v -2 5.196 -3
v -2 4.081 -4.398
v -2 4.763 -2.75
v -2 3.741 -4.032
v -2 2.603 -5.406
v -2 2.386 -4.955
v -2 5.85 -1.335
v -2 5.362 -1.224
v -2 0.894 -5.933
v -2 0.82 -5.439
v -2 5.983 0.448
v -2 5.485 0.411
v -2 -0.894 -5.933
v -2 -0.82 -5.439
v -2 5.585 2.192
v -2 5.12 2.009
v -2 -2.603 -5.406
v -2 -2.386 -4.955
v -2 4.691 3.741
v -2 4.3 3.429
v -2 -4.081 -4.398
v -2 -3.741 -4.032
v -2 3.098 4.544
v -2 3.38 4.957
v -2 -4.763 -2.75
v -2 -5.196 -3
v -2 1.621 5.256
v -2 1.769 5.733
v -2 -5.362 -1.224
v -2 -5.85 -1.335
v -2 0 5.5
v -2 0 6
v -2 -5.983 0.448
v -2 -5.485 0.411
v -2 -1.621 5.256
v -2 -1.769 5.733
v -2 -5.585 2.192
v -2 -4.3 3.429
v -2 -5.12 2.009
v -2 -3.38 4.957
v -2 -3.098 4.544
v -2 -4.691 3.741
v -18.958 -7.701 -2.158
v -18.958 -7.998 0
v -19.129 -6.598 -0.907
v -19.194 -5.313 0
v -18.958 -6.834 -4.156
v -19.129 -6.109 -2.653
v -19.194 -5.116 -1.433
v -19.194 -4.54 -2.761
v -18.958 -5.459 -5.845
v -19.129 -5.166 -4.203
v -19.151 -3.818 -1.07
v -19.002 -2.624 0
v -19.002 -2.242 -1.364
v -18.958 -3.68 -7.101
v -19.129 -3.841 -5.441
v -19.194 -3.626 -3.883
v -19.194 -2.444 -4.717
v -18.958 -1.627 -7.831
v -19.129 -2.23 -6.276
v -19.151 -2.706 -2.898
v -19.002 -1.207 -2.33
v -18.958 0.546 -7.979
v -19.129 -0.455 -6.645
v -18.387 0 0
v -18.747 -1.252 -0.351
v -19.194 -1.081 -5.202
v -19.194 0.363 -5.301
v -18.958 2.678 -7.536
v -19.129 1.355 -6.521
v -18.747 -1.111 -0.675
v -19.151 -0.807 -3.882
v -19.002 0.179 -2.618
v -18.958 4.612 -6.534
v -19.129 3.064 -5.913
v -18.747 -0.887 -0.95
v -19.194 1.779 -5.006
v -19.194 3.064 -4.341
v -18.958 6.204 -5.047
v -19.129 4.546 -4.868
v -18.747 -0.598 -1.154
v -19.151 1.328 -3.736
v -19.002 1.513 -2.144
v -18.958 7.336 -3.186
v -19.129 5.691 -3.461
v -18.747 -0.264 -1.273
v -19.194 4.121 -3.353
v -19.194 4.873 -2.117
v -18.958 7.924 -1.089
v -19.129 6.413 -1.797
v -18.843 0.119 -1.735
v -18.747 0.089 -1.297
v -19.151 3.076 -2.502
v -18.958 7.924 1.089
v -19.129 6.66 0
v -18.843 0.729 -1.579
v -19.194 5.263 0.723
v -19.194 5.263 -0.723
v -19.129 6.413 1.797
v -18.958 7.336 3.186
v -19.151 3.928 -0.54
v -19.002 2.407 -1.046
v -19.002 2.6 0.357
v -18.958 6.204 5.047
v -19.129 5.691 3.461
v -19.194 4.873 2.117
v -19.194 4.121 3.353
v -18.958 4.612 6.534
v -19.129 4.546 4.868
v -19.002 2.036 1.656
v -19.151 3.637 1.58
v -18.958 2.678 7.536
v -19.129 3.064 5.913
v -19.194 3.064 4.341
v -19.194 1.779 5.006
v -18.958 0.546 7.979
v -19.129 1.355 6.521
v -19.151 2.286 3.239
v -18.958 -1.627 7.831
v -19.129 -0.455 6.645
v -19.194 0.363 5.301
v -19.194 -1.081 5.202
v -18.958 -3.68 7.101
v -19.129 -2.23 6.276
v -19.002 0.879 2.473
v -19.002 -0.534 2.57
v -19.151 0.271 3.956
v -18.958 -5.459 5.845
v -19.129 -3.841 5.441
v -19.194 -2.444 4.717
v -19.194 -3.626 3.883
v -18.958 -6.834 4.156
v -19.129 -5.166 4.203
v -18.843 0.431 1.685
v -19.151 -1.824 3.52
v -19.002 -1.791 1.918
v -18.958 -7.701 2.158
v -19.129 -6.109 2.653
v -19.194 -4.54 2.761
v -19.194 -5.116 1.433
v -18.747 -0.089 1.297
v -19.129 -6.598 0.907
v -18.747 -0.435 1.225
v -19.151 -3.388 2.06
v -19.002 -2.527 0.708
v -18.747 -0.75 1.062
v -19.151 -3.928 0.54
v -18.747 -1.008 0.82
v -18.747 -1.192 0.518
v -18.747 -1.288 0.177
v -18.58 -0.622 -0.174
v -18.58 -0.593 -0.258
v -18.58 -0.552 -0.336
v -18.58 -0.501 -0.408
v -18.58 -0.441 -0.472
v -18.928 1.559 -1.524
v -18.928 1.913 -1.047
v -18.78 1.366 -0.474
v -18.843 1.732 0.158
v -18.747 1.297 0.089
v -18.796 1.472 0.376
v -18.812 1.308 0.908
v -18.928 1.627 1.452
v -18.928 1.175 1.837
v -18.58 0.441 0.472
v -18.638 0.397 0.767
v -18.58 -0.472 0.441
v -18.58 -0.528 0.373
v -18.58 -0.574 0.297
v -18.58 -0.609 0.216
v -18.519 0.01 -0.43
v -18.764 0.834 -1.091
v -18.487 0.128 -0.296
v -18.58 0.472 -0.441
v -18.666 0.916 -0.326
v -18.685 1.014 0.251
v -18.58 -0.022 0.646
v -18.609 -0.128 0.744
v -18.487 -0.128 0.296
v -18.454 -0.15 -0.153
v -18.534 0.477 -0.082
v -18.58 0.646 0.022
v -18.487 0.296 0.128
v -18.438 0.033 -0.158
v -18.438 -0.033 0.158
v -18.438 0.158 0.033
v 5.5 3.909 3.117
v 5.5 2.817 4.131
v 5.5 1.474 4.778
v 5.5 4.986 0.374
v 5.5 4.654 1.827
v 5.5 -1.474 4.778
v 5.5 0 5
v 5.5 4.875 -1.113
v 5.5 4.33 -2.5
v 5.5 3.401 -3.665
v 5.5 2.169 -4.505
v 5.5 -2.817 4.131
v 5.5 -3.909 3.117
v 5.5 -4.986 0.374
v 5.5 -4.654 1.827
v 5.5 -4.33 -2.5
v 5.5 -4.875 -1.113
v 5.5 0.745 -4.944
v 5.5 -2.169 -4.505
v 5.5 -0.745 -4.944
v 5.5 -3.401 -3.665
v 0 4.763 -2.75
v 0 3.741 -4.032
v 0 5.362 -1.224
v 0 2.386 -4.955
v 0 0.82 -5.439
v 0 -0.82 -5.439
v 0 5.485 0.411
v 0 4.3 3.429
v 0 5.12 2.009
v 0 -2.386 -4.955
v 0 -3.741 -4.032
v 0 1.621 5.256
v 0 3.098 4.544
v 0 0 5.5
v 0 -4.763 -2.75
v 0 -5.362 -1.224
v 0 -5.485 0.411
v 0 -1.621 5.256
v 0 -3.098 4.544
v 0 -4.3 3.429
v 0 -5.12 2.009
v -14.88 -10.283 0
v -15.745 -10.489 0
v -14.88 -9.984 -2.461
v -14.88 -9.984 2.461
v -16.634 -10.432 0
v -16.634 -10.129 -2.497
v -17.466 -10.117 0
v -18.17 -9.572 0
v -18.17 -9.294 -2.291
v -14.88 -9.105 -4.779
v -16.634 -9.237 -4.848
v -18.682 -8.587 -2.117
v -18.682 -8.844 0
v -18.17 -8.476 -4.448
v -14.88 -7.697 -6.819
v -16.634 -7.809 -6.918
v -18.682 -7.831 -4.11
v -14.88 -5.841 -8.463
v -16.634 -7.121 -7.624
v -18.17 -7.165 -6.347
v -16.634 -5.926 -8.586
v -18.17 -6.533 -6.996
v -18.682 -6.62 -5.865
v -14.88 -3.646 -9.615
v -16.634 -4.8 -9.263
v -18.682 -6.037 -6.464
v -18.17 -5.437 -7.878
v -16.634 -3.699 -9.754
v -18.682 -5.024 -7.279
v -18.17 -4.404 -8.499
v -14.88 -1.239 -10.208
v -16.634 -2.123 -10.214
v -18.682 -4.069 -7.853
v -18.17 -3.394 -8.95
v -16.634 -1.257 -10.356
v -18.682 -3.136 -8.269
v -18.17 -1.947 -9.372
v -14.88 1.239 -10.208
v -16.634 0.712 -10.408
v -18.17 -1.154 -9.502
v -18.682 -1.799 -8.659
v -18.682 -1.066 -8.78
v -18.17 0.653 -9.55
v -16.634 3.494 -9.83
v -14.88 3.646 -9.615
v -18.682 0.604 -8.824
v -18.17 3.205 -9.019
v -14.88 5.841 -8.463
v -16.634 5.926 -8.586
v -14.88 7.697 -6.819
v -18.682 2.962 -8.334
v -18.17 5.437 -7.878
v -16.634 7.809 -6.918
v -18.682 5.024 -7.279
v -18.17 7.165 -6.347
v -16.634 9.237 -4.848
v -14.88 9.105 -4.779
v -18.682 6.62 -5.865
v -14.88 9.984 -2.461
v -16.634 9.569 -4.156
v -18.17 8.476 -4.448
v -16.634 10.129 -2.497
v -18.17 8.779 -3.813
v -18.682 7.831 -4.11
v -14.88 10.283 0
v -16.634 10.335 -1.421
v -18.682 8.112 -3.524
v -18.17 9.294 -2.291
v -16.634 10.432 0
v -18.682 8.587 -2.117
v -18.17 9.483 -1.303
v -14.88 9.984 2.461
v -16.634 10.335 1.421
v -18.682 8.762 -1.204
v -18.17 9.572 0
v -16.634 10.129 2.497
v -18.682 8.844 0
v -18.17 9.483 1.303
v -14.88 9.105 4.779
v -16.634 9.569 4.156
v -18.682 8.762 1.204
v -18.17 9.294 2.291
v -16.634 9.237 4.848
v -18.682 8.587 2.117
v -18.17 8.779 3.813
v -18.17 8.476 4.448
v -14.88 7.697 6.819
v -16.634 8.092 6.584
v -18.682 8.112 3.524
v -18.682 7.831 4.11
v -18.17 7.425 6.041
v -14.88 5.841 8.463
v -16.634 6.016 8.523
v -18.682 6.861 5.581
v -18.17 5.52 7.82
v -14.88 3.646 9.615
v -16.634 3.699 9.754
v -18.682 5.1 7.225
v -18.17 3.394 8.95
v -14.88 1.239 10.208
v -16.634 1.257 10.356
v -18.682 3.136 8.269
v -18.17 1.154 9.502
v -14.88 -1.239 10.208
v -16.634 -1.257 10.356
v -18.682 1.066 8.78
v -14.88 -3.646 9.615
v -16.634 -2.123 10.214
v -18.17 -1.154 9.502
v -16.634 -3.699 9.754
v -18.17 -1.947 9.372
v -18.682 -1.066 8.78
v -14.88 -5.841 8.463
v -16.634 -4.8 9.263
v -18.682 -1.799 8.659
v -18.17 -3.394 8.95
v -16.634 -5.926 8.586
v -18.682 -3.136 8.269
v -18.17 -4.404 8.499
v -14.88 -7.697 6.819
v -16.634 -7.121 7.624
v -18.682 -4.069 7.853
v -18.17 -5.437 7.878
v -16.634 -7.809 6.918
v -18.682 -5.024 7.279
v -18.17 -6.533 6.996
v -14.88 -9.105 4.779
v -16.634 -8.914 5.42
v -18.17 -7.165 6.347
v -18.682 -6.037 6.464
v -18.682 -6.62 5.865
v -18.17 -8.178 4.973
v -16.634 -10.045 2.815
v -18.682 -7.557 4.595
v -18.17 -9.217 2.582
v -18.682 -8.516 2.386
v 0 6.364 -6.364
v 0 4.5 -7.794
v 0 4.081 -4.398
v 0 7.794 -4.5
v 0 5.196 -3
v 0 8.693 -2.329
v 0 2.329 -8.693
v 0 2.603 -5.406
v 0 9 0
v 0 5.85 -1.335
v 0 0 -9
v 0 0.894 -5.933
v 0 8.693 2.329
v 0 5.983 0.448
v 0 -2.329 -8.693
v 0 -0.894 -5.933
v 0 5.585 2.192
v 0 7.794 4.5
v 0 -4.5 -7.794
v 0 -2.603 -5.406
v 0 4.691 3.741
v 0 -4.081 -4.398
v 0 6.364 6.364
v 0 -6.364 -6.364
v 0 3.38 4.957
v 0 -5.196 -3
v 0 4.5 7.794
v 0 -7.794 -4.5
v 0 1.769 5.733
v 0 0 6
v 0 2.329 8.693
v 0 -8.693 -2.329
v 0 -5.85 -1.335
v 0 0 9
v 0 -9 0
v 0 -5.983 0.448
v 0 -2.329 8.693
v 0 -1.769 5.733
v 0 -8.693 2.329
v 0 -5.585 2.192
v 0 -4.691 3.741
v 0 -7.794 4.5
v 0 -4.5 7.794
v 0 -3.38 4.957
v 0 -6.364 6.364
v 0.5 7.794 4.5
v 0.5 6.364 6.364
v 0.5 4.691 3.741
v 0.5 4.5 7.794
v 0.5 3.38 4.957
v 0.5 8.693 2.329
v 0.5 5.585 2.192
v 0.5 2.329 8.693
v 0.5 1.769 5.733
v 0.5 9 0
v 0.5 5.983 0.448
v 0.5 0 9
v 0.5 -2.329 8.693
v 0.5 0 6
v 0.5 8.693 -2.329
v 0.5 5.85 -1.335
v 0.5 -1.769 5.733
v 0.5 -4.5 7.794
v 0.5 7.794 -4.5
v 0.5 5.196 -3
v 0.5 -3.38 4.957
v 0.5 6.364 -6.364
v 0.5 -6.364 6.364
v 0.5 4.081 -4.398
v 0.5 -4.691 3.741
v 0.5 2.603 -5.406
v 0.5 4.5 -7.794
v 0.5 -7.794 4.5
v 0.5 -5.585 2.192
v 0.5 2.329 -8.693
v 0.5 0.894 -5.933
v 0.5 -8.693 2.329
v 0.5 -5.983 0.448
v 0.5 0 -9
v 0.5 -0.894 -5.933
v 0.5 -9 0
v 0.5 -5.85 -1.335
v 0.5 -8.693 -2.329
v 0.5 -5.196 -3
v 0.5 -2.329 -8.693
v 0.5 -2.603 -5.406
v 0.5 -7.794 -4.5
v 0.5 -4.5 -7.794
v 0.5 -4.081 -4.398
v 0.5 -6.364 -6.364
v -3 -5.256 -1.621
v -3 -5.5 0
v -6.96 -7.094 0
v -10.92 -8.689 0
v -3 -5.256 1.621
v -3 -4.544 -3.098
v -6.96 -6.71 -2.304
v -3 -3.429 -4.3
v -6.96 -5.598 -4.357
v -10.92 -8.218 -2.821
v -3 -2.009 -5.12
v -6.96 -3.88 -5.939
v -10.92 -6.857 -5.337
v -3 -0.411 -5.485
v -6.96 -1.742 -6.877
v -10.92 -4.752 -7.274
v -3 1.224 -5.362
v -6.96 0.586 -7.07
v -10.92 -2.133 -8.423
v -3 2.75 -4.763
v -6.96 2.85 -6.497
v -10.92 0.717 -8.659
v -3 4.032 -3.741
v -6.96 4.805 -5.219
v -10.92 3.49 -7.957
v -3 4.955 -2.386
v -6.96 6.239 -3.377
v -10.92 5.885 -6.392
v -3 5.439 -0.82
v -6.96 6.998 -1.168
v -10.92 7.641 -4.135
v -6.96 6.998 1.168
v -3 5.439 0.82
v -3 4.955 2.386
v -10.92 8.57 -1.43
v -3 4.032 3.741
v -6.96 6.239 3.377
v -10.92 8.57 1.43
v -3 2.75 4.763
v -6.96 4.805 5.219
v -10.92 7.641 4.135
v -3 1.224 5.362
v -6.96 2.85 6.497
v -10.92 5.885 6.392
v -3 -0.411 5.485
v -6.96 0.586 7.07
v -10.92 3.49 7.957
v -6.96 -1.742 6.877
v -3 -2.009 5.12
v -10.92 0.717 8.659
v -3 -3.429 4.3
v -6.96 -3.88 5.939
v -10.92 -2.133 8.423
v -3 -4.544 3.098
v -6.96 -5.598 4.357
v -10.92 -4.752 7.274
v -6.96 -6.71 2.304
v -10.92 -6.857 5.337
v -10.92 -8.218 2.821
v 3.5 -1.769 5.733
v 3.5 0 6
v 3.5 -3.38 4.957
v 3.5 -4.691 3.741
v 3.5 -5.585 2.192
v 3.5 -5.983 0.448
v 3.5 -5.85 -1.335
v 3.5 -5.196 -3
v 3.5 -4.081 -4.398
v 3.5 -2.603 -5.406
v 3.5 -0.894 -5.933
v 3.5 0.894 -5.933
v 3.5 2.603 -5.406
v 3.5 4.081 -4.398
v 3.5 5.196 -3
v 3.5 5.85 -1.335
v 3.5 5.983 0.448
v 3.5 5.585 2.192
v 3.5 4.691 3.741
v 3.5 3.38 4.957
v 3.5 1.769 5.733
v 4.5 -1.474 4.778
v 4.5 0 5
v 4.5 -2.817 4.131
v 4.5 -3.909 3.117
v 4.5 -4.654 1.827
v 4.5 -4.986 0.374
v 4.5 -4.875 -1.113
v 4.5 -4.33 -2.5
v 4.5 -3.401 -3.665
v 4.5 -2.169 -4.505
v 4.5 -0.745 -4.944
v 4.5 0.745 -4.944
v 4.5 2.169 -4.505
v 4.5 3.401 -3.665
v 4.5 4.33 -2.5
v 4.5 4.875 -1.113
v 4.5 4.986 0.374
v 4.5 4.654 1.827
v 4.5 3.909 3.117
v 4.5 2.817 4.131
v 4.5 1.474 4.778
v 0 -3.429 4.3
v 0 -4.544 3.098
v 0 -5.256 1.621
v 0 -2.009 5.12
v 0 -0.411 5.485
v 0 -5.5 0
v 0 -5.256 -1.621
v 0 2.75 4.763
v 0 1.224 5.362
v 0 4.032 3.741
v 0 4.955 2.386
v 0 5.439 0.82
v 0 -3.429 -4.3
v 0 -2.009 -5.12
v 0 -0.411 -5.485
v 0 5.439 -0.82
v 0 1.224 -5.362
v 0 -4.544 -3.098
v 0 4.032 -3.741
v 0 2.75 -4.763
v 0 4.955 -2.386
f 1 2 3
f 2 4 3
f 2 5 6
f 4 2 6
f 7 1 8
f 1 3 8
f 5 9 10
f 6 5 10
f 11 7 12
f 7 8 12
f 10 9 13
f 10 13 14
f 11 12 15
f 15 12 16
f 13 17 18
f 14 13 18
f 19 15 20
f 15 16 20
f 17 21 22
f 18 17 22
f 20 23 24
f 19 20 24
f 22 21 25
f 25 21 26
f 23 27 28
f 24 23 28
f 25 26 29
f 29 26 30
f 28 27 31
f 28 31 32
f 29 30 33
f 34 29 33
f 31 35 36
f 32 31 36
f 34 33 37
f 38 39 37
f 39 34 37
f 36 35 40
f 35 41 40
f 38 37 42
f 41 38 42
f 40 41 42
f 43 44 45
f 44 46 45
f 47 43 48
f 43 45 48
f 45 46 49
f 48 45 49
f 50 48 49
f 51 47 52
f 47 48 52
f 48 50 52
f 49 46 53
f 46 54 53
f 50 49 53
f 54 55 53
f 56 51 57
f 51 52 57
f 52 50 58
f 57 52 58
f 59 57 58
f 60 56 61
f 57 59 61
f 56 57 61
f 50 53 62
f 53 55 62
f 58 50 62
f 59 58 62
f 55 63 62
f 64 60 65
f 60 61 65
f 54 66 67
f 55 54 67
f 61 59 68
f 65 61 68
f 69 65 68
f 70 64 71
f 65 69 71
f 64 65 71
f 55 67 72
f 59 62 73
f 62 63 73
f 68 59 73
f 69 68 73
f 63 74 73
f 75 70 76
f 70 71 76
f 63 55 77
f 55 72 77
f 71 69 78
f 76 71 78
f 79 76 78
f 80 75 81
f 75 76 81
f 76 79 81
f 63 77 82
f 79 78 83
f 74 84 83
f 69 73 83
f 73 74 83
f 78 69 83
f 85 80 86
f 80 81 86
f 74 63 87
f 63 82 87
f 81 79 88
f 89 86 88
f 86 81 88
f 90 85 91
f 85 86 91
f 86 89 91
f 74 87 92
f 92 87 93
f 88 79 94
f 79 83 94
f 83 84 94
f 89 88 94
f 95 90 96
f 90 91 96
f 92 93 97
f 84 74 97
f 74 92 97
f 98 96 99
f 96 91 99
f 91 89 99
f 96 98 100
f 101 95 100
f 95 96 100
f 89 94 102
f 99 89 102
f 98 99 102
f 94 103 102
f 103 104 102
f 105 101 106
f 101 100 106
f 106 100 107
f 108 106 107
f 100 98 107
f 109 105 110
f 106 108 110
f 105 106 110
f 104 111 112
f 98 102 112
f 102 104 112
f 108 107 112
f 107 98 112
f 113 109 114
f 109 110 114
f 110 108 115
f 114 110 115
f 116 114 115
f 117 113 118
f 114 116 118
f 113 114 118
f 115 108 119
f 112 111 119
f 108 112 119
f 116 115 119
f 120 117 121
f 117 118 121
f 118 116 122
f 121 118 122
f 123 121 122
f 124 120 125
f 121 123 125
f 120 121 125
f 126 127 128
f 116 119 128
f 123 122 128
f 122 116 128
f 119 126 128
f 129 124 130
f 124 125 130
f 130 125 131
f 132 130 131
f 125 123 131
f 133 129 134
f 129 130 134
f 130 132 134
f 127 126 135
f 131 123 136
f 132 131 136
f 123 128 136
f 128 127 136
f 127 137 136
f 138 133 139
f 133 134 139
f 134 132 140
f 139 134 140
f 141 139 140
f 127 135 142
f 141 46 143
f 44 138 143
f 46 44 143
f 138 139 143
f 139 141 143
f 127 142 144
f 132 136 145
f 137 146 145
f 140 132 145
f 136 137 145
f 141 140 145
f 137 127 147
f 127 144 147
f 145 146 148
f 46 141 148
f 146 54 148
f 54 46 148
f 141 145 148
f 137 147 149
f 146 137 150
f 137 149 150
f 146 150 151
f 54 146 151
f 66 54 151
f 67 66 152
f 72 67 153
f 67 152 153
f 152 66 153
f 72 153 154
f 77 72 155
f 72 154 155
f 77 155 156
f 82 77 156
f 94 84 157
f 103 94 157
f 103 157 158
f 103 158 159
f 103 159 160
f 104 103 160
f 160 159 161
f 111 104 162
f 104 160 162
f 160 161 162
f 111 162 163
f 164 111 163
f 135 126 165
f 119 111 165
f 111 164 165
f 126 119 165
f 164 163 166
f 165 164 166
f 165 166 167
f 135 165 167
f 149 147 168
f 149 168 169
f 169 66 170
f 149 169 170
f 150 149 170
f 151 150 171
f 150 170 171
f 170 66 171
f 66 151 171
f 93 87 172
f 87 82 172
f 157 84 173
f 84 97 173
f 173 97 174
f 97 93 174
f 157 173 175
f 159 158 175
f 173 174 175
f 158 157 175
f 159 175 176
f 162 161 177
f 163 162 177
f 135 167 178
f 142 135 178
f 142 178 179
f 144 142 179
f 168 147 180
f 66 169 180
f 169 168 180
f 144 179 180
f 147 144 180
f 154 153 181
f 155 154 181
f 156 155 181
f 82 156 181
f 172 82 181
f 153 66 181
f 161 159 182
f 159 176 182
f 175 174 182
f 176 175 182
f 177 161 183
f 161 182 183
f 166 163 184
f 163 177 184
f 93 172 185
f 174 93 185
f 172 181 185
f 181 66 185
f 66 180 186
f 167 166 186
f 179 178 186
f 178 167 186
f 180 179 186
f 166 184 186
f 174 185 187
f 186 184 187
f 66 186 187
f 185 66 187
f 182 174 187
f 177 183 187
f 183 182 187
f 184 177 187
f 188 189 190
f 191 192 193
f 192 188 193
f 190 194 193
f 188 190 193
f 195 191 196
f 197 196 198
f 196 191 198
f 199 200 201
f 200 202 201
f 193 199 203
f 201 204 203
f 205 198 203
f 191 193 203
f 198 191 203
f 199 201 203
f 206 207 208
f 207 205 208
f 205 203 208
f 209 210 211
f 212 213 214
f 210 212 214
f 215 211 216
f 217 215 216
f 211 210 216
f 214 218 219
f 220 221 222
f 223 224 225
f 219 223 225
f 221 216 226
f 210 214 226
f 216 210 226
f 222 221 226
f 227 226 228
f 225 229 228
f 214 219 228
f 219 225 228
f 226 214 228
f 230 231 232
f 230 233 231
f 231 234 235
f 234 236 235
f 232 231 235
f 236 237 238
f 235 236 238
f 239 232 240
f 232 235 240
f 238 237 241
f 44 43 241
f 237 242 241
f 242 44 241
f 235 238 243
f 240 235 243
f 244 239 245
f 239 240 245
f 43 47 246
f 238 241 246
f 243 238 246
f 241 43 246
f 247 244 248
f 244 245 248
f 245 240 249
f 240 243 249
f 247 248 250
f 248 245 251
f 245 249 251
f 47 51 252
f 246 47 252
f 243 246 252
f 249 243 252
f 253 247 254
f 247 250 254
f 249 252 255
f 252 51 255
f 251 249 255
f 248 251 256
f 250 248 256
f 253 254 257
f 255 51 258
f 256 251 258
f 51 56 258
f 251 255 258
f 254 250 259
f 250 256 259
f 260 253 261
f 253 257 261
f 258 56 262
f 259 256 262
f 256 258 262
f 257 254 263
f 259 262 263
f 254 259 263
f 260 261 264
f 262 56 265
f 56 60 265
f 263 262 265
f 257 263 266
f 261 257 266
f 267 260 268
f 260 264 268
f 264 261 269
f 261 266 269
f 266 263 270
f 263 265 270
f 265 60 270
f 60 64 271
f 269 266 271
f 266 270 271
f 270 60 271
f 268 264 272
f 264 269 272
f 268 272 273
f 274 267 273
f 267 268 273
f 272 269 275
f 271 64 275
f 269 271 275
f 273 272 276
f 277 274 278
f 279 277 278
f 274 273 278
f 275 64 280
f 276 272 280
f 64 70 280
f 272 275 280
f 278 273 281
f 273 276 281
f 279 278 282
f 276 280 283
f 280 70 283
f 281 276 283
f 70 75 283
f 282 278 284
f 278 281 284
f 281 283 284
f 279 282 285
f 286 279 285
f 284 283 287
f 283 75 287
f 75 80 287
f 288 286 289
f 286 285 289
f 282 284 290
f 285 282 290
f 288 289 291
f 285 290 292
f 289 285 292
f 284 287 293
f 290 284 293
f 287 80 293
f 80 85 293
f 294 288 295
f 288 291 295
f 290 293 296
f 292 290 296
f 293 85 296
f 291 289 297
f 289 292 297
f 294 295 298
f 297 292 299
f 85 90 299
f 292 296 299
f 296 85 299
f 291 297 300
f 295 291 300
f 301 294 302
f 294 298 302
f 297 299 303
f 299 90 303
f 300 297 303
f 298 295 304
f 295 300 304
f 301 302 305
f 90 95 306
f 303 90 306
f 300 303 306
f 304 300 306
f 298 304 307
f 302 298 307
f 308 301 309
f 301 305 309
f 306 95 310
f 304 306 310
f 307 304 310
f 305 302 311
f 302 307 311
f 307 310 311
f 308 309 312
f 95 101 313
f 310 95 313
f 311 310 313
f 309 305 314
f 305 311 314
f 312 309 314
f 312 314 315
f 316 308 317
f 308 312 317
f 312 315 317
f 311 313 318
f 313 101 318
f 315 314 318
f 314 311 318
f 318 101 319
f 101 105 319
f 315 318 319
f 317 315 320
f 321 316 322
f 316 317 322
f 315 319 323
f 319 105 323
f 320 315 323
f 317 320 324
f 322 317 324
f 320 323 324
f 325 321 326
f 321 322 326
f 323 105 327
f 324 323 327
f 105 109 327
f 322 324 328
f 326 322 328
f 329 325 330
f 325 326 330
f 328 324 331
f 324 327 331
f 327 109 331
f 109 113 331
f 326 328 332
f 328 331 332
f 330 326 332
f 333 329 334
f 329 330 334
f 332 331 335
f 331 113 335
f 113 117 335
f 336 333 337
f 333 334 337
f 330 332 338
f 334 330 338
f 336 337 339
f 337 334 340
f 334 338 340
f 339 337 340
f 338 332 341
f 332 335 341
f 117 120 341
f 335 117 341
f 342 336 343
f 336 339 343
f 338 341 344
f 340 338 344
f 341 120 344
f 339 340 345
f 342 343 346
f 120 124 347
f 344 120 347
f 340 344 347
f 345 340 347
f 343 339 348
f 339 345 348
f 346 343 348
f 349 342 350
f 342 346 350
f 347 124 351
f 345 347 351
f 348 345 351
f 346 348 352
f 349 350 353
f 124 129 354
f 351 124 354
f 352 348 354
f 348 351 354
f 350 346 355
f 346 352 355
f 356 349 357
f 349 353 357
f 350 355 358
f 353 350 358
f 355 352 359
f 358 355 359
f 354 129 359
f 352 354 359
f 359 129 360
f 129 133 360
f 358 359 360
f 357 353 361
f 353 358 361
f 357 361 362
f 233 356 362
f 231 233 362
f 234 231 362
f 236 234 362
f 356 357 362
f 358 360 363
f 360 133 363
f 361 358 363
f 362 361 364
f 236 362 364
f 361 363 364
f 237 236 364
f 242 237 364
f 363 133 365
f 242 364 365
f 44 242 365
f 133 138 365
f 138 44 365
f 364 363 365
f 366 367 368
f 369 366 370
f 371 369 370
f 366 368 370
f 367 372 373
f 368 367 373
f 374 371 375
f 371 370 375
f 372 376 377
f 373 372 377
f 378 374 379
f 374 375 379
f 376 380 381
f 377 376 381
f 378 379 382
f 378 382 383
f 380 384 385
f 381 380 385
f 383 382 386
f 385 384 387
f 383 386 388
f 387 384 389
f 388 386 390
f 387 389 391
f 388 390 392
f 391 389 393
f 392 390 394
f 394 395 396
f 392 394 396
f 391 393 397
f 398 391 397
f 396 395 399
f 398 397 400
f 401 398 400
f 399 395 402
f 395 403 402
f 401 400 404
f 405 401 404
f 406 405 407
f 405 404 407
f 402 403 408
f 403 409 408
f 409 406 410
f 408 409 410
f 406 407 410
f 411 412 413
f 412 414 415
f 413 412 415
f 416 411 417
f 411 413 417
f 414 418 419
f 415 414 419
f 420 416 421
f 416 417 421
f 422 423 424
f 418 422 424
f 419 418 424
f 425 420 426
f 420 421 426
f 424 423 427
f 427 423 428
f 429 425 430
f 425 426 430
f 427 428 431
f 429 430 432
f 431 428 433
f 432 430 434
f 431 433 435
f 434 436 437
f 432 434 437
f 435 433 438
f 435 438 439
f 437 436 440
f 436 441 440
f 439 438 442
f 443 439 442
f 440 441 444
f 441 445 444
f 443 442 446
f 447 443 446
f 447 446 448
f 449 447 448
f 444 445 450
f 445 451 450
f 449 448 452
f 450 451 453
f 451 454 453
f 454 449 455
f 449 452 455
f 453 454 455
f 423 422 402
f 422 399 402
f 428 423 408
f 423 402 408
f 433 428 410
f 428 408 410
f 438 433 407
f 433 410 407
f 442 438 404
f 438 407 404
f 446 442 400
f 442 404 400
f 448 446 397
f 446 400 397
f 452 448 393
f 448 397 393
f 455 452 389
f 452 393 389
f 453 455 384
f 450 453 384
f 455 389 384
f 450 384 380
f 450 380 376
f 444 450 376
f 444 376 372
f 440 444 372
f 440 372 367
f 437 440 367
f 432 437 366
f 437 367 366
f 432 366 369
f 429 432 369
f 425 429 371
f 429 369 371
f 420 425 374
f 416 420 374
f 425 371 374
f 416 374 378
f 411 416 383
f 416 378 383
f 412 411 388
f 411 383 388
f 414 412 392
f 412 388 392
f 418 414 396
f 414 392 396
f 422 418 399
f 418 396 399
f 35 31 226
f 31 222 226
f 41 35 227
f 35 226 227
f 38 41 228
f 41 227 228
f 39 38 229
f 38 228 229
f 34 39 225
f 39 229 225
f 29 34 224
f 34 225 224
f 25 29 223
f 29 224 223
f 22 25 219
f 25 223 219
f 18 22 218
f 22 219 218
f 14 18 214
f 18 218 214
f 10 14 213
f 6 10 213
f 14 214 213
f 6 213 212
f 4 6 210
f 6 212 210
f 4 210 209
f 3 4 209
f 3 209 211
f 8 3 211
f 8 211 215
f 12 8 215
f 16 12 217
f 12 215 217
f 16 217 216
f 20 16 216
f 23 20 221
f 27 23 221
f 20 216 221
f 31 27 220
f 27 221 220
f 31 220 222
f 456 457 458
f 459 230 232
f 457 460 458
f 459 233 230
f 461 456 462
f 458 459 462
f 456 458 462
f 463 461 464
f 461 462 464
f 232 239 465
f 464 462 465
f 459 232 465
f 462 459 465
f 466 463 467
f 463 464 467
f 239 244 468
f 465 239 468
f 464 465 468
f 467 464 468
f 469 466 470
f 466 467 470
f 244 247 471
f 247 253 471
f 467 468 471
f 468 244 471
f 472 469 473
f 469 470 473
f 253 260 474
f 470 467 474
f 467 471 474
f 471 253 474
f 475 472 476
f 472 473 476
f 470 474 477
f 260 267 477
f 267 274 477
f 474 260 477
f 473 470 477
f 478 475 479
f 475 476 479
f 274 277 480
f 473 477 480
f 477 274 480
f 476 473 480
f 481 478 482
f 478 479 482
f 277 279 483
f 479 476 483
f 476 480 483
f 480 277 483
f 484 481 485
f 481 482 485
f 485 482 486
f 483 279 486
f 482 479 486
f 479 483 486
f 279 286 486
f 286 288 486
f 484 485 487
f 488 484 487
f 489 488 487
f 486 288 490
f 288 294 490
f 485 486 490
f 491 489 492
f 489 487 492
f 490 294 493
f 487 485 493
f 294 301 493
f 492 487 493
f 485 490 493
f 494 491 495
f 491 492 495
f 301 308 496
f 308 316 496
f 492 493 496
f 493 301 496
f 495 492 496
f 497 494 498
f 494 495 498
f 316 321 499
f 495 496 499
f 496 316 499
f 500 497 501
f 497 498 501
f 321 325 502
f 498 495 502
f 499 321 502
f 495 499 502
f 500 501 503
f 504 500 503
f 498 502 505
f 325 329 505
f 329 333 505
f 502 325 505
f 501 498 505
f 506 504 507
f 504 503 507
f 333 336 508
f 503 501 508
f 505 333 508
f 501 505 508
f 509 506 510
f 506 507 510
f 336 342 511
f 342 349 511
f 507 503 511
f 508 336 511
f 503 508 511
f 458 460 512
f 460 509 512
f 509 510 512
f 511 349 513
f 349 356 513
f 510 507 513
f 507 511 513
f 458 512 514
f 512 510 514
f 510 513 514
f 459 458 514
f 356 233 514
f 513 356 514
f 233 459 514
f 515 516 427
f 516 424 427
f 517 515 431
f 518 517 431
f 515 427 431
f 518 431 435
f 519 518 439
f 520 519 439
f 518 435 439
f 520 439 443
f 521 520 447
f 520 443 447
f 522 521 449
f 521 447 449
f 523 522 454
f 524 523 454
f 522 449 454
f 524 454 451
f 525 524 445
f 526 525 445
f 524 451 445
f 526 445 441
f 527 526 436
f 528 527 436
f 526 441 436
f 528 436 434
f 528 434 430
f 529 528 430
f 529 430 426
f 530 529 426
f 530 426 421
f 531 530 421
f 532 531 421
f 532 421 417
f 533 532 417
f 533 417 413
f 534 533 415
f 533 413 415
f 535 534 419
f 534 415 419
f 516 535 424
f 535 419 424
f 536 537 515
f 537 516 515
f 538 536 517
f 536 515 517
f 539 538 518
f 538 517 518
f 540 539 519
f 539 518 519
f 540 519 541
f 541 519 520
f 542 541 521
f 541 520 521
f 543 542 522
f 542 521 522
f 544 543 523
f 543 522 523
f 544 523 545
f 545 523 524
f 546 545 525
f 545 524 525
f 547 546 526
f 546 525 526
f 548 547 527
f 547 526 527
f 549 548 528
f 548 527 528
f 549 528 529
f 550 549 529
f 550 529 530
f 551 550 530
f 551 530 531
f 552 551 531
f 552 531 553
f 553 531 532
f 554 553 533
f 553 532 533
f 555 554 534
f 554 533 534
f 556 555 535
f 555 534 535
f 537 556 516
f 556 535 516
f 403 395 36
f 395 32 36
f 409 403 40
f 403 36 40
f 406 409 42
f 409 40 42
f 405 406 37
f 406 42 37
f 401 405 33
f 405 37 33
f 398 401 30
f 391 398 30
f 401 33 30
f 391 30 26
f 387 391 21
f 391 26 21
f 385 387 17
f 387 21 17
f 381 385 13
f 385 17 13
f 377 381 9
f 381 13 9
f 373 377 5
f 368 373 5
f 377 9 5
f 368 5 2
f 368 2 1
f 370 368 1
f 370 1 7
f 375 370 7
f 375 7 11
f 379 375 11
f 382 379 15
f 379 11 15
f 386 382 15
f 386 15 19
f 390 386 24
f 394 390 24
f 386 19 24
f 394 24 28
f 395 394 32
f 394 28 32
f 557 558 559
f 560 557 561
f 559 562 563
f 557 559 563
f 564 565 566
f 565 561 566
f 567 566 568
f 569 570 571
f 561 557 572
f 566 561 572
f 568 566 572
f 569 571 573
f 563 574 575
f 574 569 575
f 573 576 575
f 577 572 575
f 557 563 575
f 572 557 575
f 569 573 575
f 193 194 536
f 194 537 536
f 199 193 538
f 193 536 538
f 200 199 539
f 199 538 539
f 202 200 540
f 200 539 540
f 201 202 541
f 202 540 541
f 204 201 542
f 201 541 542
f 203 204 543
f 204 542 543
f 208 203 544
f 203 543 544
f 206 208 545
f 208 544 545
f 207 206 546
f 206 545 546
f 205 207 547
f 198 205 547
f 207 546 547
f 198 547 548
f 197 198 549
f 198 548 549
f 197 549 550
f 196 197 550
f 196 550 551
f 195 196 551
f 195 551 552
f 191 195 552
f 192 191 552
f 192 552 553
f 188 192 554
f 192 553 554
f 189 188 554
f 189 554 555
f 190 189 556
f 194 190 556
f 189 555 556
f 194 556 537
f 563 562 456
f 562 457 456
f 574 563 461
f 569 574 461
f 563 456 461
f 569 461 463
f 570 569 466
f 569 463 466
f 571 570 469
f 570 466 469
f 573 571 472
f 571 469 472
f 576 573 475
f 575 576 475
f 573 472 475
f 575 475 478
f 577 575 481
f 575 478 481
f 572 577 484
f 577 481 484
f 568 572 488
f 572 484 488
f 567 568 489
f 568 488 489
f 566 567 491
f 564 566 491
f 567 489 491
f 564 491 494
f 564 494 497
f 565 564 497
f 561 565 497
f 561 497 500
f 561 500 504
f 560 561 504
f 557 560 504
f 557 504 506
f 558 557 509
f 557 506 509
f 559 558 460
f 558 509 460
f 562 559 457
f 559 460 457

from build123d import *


with BuildPart() as part:
    # Szkic1 → Obrót1 (revolve)
    with BuildSketch(Plane.XY, mode=Mode.PRIVATE) as obr_t1_sk:
        Polygon((0, 0), (5.5, 0), (5.5, 5), (4.5, 5), (3.5, 6), (0.5, 6), (0.5, 9), (0, 9), (0, 6), (-2, 6), (-2, 5.5), (0, 5.5), align=None)
    revolve(obr_t1_sk.sketch.rotate(Axis((0, 0, 0), (1, 0, 0)), 90), axis=Axis((0, 0, 0), (1, 0, 0)))


with BuildPart() as body_2:
    # Szkic2 → Obrót2 (revolve)
    with BuildSketch(Plane.XY, mode=Mode.PRIVATE) as obr_t2_sk:
        with BuildLine():
            Line((0, 0), (0, 5.5))
            Line((0, 5.5), (-3, 5.5))
            Line((-3, 5.5), (-14.879552076, 10.282911506))
            ThreePointArc((-14.879552076, 10.282911506), (-17.466149273, 10.117328086), (-18.958363304, 7.998082886))
            ThreePointArc((-18.958363304, 7.998082886), (-19.151136536, 3.964890249), (-18.387297757, 0))
            Line((-18.387297757, 0), (0, 0))
        make_face()
    revolve(obr_t2_sk.sketch.rotate(Axis((-18.387297757, 0, 0), (1, 0, 0)), 180), axis=Axis((-18.387297757, 0, 0), (1, 0, 0)))


solid = Compound([part.part, body_2.part])
